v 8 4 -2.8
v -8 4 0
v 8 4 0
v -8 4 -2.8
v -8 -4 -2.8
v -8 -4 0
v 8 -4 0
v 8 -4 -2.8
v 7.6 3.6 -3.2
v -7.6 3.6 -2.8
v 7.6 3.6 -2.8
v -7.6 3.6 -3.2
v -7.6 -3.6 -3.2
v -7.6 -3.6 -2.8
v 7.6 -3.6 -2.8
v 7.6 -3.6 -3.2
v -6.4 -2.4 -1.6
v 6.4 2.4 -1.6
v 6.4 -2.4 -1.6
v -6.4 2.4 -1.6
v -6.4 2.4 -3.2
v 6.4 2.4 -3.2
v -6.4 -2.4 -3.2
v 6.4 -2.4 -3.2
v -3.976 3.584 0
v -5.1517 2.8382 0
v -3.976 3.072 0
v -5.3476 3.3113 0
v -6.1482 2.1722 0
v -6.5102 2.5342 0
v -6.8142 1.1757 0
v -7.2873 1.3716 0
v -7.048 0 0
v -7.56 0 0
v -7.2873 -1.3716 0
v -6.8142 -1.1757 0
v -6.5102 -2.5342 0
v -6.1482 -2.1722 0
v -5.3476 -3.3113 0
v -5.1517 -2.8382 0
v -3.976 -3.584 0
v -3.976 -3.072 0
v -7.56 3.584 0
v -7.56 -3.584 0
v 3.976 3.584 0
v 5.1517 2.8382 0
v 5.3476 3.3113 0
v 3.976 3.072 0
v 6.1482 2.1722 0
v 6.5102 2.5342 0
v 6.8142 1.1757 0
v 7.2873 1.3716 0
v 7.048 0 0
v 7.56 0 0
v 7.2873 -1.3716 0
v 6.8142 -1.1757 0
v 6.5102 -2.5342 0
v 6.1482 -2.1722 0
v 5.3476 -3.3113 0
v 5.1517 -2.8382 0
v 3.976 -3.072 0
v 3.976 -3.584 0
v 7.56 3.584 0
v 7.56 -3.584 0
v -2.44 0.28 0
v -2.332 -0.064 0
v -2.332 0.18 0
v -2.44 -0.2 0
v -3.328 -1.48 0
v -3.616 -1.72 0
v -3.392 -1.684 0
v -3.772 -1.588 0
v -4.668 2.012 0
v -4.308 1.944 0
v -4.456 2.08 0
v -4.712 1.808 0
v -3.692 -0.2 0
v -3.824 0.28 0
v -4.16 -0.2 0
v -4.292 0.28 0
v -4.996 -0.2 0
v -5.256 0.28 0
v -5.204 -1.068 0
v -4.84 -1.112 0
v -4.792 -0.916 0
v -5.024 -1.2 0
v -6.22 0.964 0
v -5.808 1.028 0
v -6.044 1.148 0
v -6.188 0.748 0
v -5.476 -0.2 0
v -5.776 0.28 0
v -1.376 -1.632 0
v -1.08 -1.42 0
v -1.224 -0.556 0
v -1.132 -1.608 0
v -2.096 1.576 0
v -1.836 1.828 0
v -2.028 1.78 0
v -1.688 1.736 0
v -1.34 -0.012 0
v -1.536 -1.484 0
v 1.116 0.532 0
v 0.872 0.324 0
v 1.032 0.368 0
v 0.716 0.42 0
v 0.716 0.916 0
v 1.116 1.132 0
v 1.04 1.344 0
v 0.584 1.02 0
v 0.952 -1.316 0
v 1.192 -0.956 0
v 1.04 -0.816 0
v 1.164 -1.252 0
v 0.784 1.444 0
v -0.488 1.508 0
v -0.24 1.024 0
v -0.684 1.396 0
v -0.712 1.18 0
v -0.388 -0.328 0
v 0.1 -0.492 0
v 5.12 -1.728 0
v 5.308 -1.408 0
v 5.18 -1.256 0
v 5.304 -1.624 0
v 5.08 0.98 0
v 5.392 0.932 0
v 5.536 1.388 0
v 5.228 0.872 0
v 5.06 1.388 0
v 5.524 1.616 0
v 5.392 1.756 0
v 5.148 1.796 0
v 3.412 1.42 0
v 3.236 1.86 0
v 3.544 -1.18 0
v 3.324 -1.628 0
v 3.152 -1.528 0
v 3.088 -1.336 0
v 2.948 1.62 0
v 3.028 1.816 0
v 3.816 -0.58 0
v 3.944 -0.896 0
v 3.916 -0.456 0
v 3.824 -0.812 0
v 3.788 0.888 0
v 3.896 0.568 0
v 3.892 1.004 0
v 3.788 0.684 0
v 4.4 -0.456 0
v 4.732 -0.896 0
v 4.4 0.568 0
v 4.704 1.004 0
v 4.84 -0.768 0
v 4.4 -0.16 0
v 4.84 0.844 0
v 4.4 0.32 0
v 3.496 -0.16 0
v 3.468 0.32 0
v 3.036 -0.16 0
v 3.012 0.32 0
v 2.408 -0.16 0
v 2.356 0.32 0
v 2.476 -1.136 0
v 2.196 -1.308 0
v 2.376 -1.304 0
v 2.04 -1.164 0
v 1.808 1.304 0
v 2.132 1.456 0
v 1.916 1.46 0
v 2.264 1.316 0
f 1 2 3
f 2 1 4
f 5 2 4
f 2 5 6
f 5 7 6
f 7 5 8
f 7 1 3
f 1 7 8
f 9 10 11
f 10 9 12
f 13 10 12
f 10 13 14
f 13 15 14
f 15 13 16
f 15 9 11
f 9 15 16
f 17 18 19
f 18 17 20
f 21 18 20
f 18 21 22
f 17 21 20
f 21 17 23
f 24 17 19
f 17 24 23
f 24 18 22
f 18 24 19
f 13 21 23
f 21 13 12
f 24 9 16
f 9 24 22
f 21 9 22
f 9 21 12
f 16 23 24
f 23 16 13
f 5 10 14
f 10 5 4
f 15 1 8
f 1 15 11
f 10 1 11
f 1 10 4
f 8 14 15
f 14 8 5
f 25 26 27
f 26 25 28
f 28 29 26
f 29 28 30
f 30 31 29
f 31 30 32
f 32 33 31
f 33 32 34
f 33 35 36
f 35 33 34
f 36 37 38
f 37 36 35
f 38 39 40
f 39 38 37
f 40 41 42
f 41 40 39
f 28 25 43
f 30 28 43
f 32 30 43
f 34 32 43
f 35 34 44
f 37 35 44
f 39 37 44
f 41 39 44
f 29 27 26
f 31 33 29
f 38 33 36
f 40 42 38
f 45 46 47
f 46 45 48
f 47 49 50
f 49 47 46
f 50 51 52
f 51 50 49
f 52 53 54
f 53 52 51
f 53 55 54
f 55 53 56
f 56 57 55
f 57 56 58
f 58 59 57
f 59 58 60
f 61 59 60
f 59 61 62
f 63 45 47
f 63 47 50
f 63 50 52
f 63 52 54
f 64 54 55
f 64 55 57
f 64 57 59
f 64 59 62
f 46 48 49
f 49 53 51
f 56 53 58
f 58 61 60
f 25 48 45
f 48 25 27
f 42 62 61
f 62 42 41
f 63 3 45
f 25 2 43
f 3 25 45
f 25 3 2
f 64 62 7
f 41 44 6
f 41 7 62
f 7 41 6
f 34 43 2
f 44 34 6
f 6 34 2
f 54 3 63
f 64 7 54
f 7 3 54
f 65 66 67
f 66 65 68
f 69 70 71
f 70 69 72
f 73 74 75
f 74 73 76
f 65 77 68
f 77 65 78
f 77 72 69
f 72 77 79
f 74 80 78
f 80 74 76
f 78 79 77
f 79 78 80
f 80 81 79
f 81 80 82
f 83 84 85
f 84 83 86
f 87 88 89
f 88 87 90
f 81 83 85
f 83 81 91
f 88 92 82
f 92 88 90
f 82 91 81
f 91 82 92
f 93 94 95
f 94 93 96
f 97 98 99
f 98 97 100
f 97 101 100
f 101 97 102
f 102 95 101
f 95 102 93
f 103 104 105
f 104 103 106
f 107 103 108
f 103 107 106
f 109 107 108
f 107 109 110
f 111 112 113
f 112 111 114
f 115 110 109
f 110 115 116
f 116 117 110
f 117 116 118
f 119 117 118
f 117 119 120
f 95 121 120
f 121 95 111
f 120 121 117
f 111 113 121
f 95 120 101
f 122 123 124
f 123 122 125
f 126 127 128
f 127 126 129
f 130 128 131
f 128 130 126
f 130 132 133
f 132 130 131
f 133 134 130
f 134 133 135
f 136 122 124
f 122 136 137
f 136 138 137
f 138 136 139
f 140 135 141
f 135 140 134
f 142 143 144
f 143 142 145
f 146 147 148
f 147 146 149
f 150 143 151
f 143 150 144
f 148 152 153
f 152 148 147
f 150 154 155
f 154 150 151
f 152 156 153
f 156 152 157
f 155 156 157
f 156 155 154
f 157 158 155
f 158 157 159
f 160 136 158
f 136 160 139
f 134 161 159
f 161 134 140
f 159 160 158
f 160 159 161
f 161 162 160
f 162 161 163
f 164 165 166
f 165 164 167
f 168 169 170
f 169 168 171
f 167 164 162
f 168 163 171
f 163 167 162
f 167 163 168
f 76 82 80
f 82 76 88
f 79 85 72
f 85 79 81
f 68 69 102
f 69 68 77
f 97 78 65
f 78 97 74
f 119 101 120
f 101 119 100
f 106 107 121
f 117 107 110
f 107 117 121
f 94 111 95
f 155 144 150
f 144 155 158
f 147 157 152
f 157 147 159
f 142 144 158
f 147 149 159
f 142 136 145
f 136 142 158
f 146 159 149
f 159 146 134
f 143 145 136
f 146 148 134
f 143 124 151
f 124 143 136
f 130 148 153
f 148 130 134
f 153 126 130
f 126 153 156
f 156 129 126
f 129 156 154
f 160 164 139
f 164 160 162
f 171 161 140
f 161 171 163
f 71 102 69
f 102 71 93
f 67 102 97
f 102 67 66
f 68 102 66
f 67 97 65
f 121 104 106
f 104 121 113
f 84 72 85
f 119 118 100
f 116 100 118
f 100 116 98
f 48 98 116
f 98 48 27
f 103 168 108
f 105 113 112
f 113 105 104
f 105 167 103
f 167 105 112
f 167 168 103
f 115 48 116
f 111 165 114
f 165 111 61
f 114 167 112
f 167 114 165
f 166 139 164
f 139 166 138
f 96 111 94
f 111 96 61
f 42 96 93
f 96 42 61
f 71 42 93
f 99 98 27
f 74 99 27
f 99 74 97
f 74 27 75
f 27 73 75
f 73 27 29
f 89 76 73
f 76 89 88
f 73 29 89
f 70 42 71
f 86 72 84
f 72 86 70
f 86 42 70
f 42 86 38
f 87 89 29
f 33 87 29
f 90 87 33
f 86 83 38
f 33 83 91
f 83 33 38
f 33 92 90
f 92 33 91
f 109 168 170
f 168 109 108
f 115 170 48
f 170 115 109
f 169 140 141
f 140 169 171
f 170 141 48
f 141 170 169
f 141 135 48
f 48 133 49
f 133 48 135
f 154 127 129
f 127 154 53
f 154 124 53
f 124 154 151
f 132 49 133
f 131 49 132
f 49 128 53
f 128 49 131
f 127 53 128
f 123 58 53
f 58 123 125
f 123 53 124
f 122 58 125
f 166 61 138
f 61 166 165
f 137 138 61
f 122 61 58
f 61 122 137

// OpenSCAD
// file: ../p/box5.scad
use <../lib.scad>
function ldraw_lib__box5() = [
// 0 Box with 5 Faces and All Edges
// 0 Name: box5.dat
// 0 Author: James Jessiman
// 0 !LDRAW_ORG Primitive UPDATE 2012-01
// 0 !LICENSE Licensed under CC BY 4.0 : see CAreadme.txt
// 
// 0 BFC CERTIFY CCW
  [0,"BFC","CERTIFY"],
  [0,"BFC","CCW"],
// 
// 0 !HISTORY 2002-04-03 [sbliss] Modified for BFC compliance
// 0 !HISTORY 2002-04-25 [PTadmin] Official Update 2002-02
// 0 !HISTORY 2007-06-24 [PTadmin] Header formatted for Contributor Agreement
// 0 !HISTORY 2008-07-01 [PTadmin] Official Update 2008-01
// 0 !HISTORY 2012-02-16 [Philo] Changed to CCW
// 0 !HISTORY 2012-03-30 [PTadmin] Official Update 2012-01
// 
// 
// 2 24 1 1 1 -1 1 1
  [2,24,1,1,1,-1,1,1],
// 2 24 -1 1 1 -1 1 -1
  [2,24,-1,1,1,-1,1,-1],
// 2 24 -1 1 -1 1 1 -1
  [2,24,-1,1,-1,1,1,-1],
// 2 24 1 1 -1 1 1 1
  [2,24,1,1,-1,1,1,1],
// 2 24 1 0 1 -1 0 1
  [2,24,1,0,1,-1,0,1],
// 2 24 -1 0 1 -1 0 -1
  [2,24,-1,0,1,-1,0,-1],
// 2 24 -1 0 -1 1 0 -1
  [2,24,-1,0,-1,1,0,-1],
// 2 24 1 0 -1 1 0 1
  [2,24,1,0,-1,1,0,1],
// 2 24 1 0 1 1 1 1
  [2,24,1,0,1,1,1,1],
// 2 24 -1 0 1 -1 1 1
  [2,24,-1,0,1,-1,1,1],
// 2 24 1 0 -1 1 1 -1
  [2,24,1,0,-1,1,1,-1],
// 2 24 -1 0 -1 -1 1 -1
  [2,24,-1,0,-1,-1,1,-1],
// 4 16 -1 1 1 1 1 1 1 1 -1 -1 1 -1
  [4,16,-1,1,1,1,1,1,1,1,-1,-1,1,-1],
// 4 16 -1 1 1 -1 0 1 1 0 1 1 1 1
  [4,16,-1,1,1,-1,0,1,1,0,1,1,1,1],
// 4 16 -1 1 -1 -1 0 -1 -1 0 1 -1 1 1
  [4,16,-1,1,-1,-1,0,-1,-1,0,1,-1,1,1],
// 4 16 1 1 -1 1 0 -1 -1 0 -1 -1 1 -1
  [4,16,1,1,-1,1,0,-1,-1,0,-1,-1,1,-1],
// 4 16 1 1 1 1 0 1 1 0 -1 1 1 -1
  [4,16,1,1,1,1,0,1,1,0,-1,1,1,-1],
];
module ldraw_lib__box5(step=0, col=false, unit=2/5, alt=false, line=0.2, solid=!$preview)
    makepoly(ldraw_lib__box5(), step=step, col=col, unit=unit, alt=alt, line=line, solid=solid);
ldraw_lib__box5(line=0.2);
// file: ../p/box4.scad
use <../lib.scad>
function ldraw_lib__box4() = [
// 0 Box with 4 Faces (2 Parallel Pairs) and All Edges
// 0 Name: box4.dat
// 0 Author: James Jessiman
// 0 !LDRAW_ORG Primitive UPDATE 2012-01
// 0 !LICENSE Licensed under CC BY 4.0 : see CAreadme.txt
// 
// 0 BFC CERTIFY CCW
  [0,"BFC","CERTIFY"],
  [0,"BFC","CCW"],
// 
// 0 !HISTORY 2002-04-03 [sbliss] Modified for BFC compliance
// 0 !HISTORY 2002-04-25 [PTadmin] Official Update 2002-02
// 0 !HISTORY 2007-06-24 [PTadmin] Header formatted for Contributor Agreement
// 0 !HISTORY 2008-07-01 [PTadmin] Official Update 2008-01
// 0 !HISTORY 2012-02-16 [Philo] Changed to CCW
// 0 !HISTORY 2012-03-30 [PTadmin] Official Update 2012-01
// 
// 
// 2 24 1 1 1 -1 1 1
  [2,24,1,1,1,-1,1,1],
// 2 24 -1 1 1 -1 1 -1
  [2,24,-1,1,1,-1,1,-1],
// 2 24 -1 1 -1 1 1 -1
  [2,24,-1,1,-1,1,1,-1],
// 2 24 1 1 -1 1 1 1
  [2,24,1,1,-1,1,1,1],
// 2 24 1 0 1 -1 0 1
  [2,24,1,0,1,-1,0,1],
// 2 24 -1 0 1 -1 0 -1
  [2,24,-1,0,1,-1,0,-1],
// 2 24 -1 0 -1 1 0 -1
  [2,24,-1,0,-1,1,0,-1],
// 2 24 1 0 -1 1 0 1
  [2,24,1,0,-1,1,0,1],
// 2 24 1 0 1 1 1 1
  [2,24,1,0,1,1,1,1],
// 2 24 -1 0 1 -1 1 1
  [2,24,-1,0,1,-1,1,1],
// 2 24 1 0 -1 1 1 -1
  [2,24,1,0,-1,1,1,-1],
// 2 24 -1 0 -1 -1 1 -1
  [2,24,-1,0,-1,-1,1,-1],
// 4 16 -1 1 1 -1 0 1 1 0 1 1 1 1
  [4,16,-1,1,1,-1,0,1,1,0,1,1,1,1],
// 4 16 -1 1 -1 -1 0 -1 -1 0 1 -1 1 1
  [4,16,-1,1,-1,-1,0,-1,-1,0,1,-1,1,1],
// 4 16 1 1 -1 1 0 -1 -1 0 -1 -1 1 -1
  [4,16,1,1,-1,1,0,-1,-1,0,-1,-1,1,-1],
// 4 16 1 1 1 1 0 1 1 0 -1 1 1 -1
  [4,16,1,1,1,1,0,1,1,0,-1,1,1,-1],
];
module ldraw_lib__box4(step=0, col=false, unit=2/5, alt=false, line=0.2, solid=!$preview)
    makepoly(ldraw_lib__box4(), step=step, col=col, unit=unit, alt=alt, line=line, solid=solid);
ldraw_lib__box4(line=0.2);
// file: s/3069bs01.scad
use <../../lib.scad>
use <../../p/box4.scad>
use <../../p/box5.scad>
function ldraw_lib__s__3069bs01() = [
// 0 ~Tile  1 x  2 with Groove without Top Face
// 0 Name: s\3069bs01.dat
// 0 Author: Santeri Piippo [arezey]
// 0 !LDRAW_ORG Subpart UPDATE 2010-02
// 0 !LICENSE Licensed under CC BY 4.0 : see CAreadme.txt
// 
// 0 BFC CERTIFY CCW
  [0,"BFC","CERTIFY"],
  [0,"BFC","CCW"],
// 
// 0 !HISTORY 2010-07-05 [PTadmin] Official Update 2010-02
// 
// 
// 1 16 0 0 0 20 0 0 0 7 0 0 0 10 box4.dat
  [1,16,0,0,0,20,0,0,0,7,0,0,0,10, ldraw_lib__box4()],
// 1 16 0 7 0 19 0 0 0 1 0 0 0 9 box4.dat
  [1,16,0,7,0,19,0,0,0,1,0,0,0,9, ldraw_lib__box4()],
// 0 BFC INVERTNEXT
  [0,"BFC","INVERTNEXT"],
// 1 16 0 8 0 16 0 0 0 -4 0 0 0 6 box5.dat
  [1,16,0,8,0,16,0,0,0,-4,0,0,0,6, ldraw_lib__box5()],
// 4 16 -19 8 9 -16 8 6 -16 8 -6 -19 8 -9
  [4,16,-19,8,9,-16,8,6,-16,8,-6,-19,8,-9],
// 4 16 19 8 -9 16 8 -6 16 8 6 19 8 9
  [4,16,19,8,-9,16,8,-6,16,8,6,19,8,9],
// 4 16 19 8 9 16 8 6 -16 8 6 -19 8 9
  [4,16,19,8,9,16,8,6,-16,8,6,-19,8,9],
// 4 16 -19 8 -9 -16 8 -6 16 8 -6 19 8 -9
  [4,16,-19,8,-9,-16,8,-6,16,8,-6,19,8,-9],
// 4 16 -20 7 10 -19 7 9 -19 7 -9 -20 7 -10
  [4,16,-20,7,10,-19,7,9,-19,7,-9,-20,7,-10],
// 4 16 20 7 -10 19 7 -9 19 7 9 20 7 10
  [4,16,20,7,-10,19,7,-9,19,7,9,20,7,10],
// 4 16 20 7 10 19 7 9 -19 7 9 -20 7 10
  [4,16,20,7,10,19,7,9,-19,7,9,-20,7,10],
// 4 16 -20 7 -10 -19 7 -9 19 7 -9 20 7 -10
  [4,16,-20,7,-10,-19,7,-9,19,7,-9,20,7,-10],
// 0 //
];
module ldraw_lib__s__3069bs01(step=0, col=false, unit=2/5, alt=false, line=0.2, solid=!$preview)
    makepoly(ldraw_lib__s__3069bs01(), step=step, col=col, unit=unit, alt=alt, line=line, solid=solid);
ldraw_lib__s__3069bs01(line=0.2);
// file: ../p/2-4ring6.scad
use <../lib.scad>
function ldraw_lib__2_4ring6() = [
// 0 Ring  6 x 0.5
// 0 Name: 2-4ring6.dat
// 0 Author: Niels Karsdorp [nielsk]
// 0 !LDRAW_ORG Primitive UPDATE 2012-01
// 0 !LICENSE Licensed under CC BY 4.0 : see CAreadme.txt
// 
// 0 BFC CERTIFY CCW
  [0,"BFC","CERTIFY"],
  [0,"BFC","CCW"],
// 
// 0 !HISTORY 2004-09-15 [PTadmin] Official Update 2004-03
// 0 !HISTORY 2007-06-24 [PTadmin] Header formatted for Contributor Agreement
// 0 !HISTORY 2008-07-01 [PTadmin] Official Update 2008-01
// 0 !HISTORY 2012-02-16 [Philo] Changed to CCW
// 0 !HISTORY 2012-03-30 [PTadmin] Official Update 2012-01
// 
// 
// 4 16 7 0 0 6.4673 0 2.6789 5.5434 0 2.2962 6 0 0
  [4,16,7,0,0,6.4673,0,2.6789,5.5434,0,2.2962,6,0,0],
// 4 16 6.4673 0 2.6789 4.9497 0 4.9497 4.2426 0 4.2426 5.5434 0 2.2962
  [4,16,6.4673,0,2.6789,4.9497,0,4.9497,4.2426,0,4.2426,5.5434,0,2.2962],
// 4 16 4.9497 0 4.9497 2.6789 0 6.4673 2.2962 0 5.5434 4.2426 0 4.2426
  [4,16,4.9497,0,4.9497,2.6789,0,6.4673,2.2962,0,5.5434,4.2426,0,4.2426],
// 4 16 2.6789 0 6.4673 0 0 7 0 0 6 2.2962 0 5.5434
  [4,16,2.6789,0,6.4673,0,0,7,0,0,6,2.2962,0,5.5434],
// 4 16 0 0 7 -2.6789 0 6.4673 -2.2962 0 5.5434 0 0 6
  [4,16,0,0,7,-2.6789,0,6.4673,-2.2962,0,5.5434,0,0,6],
// 4 16 -2.6789 0 6.4673 -4.9497 0 4.9497 -4.2426 0 4.2426 -2.2962 0 5.5434
  [4,16,-2.6789,0,6.4673,-4.9497,0,4.9497,-4.2426,0,4.2426,-2.2962,0,5.5434],
// 4 16 -4.9497 0 4.9497 -6.4673 0 2.6789 -5.5434 0 2.2962 -4.2426 0 4.2426
  [4,16,-4.9497,0,4.9497,-6.4673,0,2.6789,-5.5434,0,2.2962,-4.2426,0,4.2426],
// 4 16 -6.4673 0 2.6789 -7 0 0 -6 0 0 -5.5434 0 2.2962
  [4,16,-6.4673,0,2.6789,-7,0,0,-6,0,0,-5.5434,0,2.2962],
];
module ldraw_lib__2_4ring6(step=0, col=false, unit=2/5, alt=false, line=0.2, solid=!$preview)
    makepoly(ldraw_lib__2_4ring6(), step=step, col=col, unit=unit, alt=alt, line=line, solid=solid);
ldraw_lib__2_4ring6(line=0.2);
// file: ../p/2-4ndis.scad
use <../lib.scad>
function ldraw_lib__2_4ndis() = [
// 0 Disc Negative 0.5
// 0 Name: 2-4ndis.dat
// 0 Author: James Jessiman
// 0 !LDRAW_ORG Primitive UPDATE 2012-01
// 0 !LICENSE Licensed under CC BY 4.0 : see CAreadme.txt
// 
// 0 BFC CERTIFY CCW
  [0,"BFC","CERTIFY"],
  [0,"BFC","CCW"],
// 
// 0 !HISTORY 2002-03-23 [sbliss] Added BFC statement; compacted code
// 0 !HISTORY 2002-04-25 [PTadmin] Official Update 2002-02
// 0 !HISTORY 2007-06-24 [PTadmin] Header formatted for Contributor Agreement
// 0 !HISTORY 2008-07-01 [PTadmin] Official Update 2008-01
// 0 !HISTORY 2012-02-16 [Philo] Changed to CCW
// 0 !HISTORY 2012-03-30 [PTadmin] Official Update 2012-01
// 
// 
// 3 16 0.9239 0 0.3827 1 0 0 1 0 1
  [3,16,0.9239,0,0.3827,1,0,0,1,0,1],
// 3 16 0.7071 0 0.7071 0.9239 0 0.3827 1 0 1
  [3,16,0.7071,0,0.7071,0.9239,0,0.3827,1,0,1],
// 3 16 0.3827 0 0.9239 0.7071 0 0.7071 1 0 1
  [3,16,0.3827,0,0.9239,0.7071,0,0.7071,1,0,1],
// 3 16 0 0 1 0.3827 0 0.9239 1 0 1
  [3,16,0,0,1,0.3827,0,0.9239,1,0,1],
// 3 16 -0.3827 0 0.9239 0 0 1 -1 0 1
  [3,16,-0.3827,0,0.9239,0,0,1,-1,0,1],
// 3 16 -0.7071 0 0.7071 -0.3827 0 0.9239 -1 0 1
  [3,16,-0.7071,0,0.7071,-0.3827,0,0.9239,-1,0,1],
// 3 16 -0.9239 0 0.3827 -0.7071 0 0.7071 -1 0 1
  [3,16,-0.9239,0,0.3827,-0.7071,0,0.7071,-1,0,1],
// 3 16 -1 0 0 -0.9239 0 0.3827 -1 0 1
  [3,16,-1,0,0,-0.9239,0,0.3827,-1,0,1],
];
module ldraw_lib__2_4ndis(step=0, col=false, unit=2/5, alt=false, line=0.2, solid=!$preview)
    makepoly(ldraw_lib__2_4ndis(), step=step, col=col, unit=unit, alt=alt, line=line, solid=solid);
ldraw_lib__2_4ndis(line=0.2);
// file: ../p/1-8chrd.scad
use <../lib.scad>
function ldraw_lib__1_8chrd() = [
// 0 Chord 0.125
// 0 Name: 1-8chrd.dat
// 0 Author: Orion Pobursky [OrionP]
// 0 !LDRAW_ORG Primitive UPDATE 2023-05
// 0 !LICENSE Licensed under CC BY 4.0 : see CAreadme.txt
// 
// 0 BFC CERTIFY CCW
  [0,"BFC","CERTIFY"],
  [0,"BFC","CCW"],
// 
// 0 !HISTORY 2004-04-22 [PTadmin] Official Update 2004-02
// 0 !HISTORY 2007-06-22 [PTadmin] Header formatted for Contributor Agreement
// 0 !HISTORY 2008-07-01 [PTadmin] Official Update 2008-01
// 0 !HISTORY 2023-10-27 [OrionP] Rebuilt with PrimGen2, original author westrate
// 0 !HISTORY 2023-10-31 [OrionP] Official Update 2023-05
// 
// 3 16 1 0 0 0.9239 0 0.3827 0.7071 0 0.7071
  [3,16,1,0,0,0.9239,0,0.3827,0.7071,0,0.7071],
];
module ldraw_lib__1_8chrd(step=0, col=false, unit=2/5, alt=false, line=0.2, solid=!$preview)
    makepoly(ldraw_lib__1_8chrd(), step=step, col=col, unit=unit, alt=alt, line=line, solid=solid);
ldraw_lib__1_8chrd(line=0.2);
// main file
use <../lib.scad>
use <../p/1-8chrd.scad>
use <../p/2-4ndis.scad>
use <../p/2-4ring6.scad>
use <s/3069bs01.scad>
function ldraw_lib__3069bp1d() = [
// 0 Tile  1 x  2 with Black Japanese Logogramm (10 million ryo) Pattern
// 0 Name: 3069bp1d.dat
// 0 Author: Manfred Schaefer [Lego-Manfred]
// 0 !LDRAW_ORG Part UPDATE 2024-10
// 0 !LICENSE Licensed under CC BY 4.0 : see CAreadme.txt
// 
// 0 BFC CERTIFY CCW
  [0,"BFC","CERTIFY"],
  [0,"BFC","CCW"],
// 
// 0 !KEYWORDS Brickheadz, BrickLink 3069pb0767, Brickowl 684565, Lucky Cat
// 0 !KEYWORDS Rebrickable 3069bpr0280, Set 40436
// 
// 0 !HISTORY 2024-12-01 [OrionP] Official Update 2024-10
// 
// 1 16 0 0 0 1 0 0 0 1 0 0 0 1 s\3069bs01.dat
  [1,16,0,0,0,1,0,0,0,1,0,0,0,1, ldraw_lib__s__3069bs01()],
// 0 BFC CERTIFY CCW
  [0,"BFC","CERTIFY"],
  [0,"BFC","CCW"],
// 
// 1 0 -9.94 0 0 0 0 -1.28 0 1 0 1.28 0 0 2-4ring6.dat
  [1,0,-9.94,0,0,0,0,-1.28,0,1,0,1.28,0,0, ldraw_lib__2_4ring6()],
// 1 16 -9.94 0 0 0 0 -8.96 0 1 0 8.96 0 0 2-4ndis.dat
  [1,16,-9.94,0,0,0,0,-8.96,0,1,0,8.96,0,0, ldraw_lib__2_4ndis()],
// 1 16 -9.94 0 0 0 0 -7.68 0 1 0 7.68 0 0 1-8chrd.dat
  [1,16,-9.94,0,0,0,0,-7.68,0,1,0,7.68,0,0, ldraw_lib__1_8chrd()],
// 1 16 -9.94 0 0 -7.68 0 0 0 1 0 0 0 7.68 1-8chrd.dat
  [1,16,-9.94,0,0,-7.68,0,0,0,1,0,0,0,7.68, ldraw_lib__1_8chrd()],
// 1 16 -9.94 0 0 -7.68 0 0 0 1 0 0 0 -7.68 1-8chrd.dat
  [1,16,-9.94,0,0,-7.68,0,0,0,1,0,0,0,-7.68, ldraw_lib__1_8chrd()],
// 1 16 -9.94 0 0 0 0 -7.68 0 1 0 -7.68 0 0 1-8chrd.dat
  [1,16,-9.94,0,0,0,0,-7.68,0,1,0,-7.68,0,0, ldraw_lib__1_8chrd()],
// 1 0 9.94 0 0 0 0 1.28 0 1 0 1.28 0 0 2-4ring6.dat
  [1,0,9.94,0,0,0,0,1.28,0,1,0,1.28,0,0, ldraw_lib__2_4ring6()],
// 1 16 9.94 0 0 0 0 8.96 0 1 0 8.96 0 0 2-4ndis.dat
  [1,16,9.94,0,0,0,0,8.96,0,1,0,8.96,0,0, ldraw_lib__2_4ndis()],
// 1 16 9.94 0 0 0 0 7.68 0 1 0 7.68 0 0 1-8chrd.dat
  [1,16,9.94,0,0,0,0,7.68,0,1,0,7.68,0,0, ldraw_lib__1_8chrd()],
// 1 16 9.94 0 0 7.68 0 0 0 1 0 0 0 7.68 1-8chrd.dat
  [1,16,9.94,0,0,7.68,0,0,0,1,0,0,0,7.68, ldraw_lib__1_8chrd()],
// 1 16 9.94 0 0 7.68 0 0 0 1 0 0 0 -7.68 1-8chrd.dat
  [1,16,9.94,0,0,7.68,0,0,0,1,0,0,0,-7.68, ldraw_lib__1_8chrd()],
// 1 16 9.94 0 0 0 0 7.68 0 1 0 -7.68 0 0 1-8chrd.dat
  [1,16,9.94,0,0,0,0,7.68,0,1,0,-7.68,0,0, ldraw_lib__1_8chrd()],
// 4 0 -9.94 0 7.68 9.94 0 7.68 9.94 0 8.96 -9.94 0 8.96
  [4,0,-9.94,0,7.68,9.94,0,7.68,9.94,0,8.96,-9.94,0,8.96],
// 4 0 -9.94 0 -8.96 9.94 0 -8.96 9.94 0 -7.68 -9.94 0 -7.68
  [4,0,-9.94,0,-8.96,9.94,0,-8.96,9.94,0,-7.68,-9.94,0,-7.68],
// 3 16 18.9 0 8.96 20 0 10 9.94 0 8.96
  [3,16,18.9,0,8.96,20,0,10,9.94,0,8.96],
// 3 16 -9.94 0 8.96 -20 0 10 -18.9 0 8.96
  [3,16,-9.94,0,8.96,-20,0,10,-18.9,0,8.96],
// 4 16 20 0 10 -20 0 10 -9.94 0 8.96 9.94 0 8.96
  [4,16,20,0,10,-20,0,10,-9.94,0,8.96,9.94,0,8.96],
// 3 16 18.9 0 -8.96 9.94 0 -8.96 20 0 -10
  [3,16,18.9,0,-8.96,9.94,0,-8.96,20,0,-10],
// 3 16 -9.94 0 -8.96 -18.9 0 -8.96 -20 0 -10
  [3,16,-9.94,0,-8.96,-18.9,0,-8.96,-20,0,-10],
// 4 16 20 0 -10 9.94 0 -8.96 -9.94 0 -8.96 -20 0 -10
  [4,16,20,0,-10,9.94,0,-8.96,-9.94,0,-8.96,-20,0,-10],
// 3 16 -18.9 0 0 -18.9 0 8.96 -20 0 10
  [3,16,-18.9,0,0,-18.9,0,8.96,-20,0,10],
// 3 16 -18.9 0 -8.96 -18.9 0 0 -20 0 -10
  [3,16,-18.9,0,-8.96,-18.9,0,0,-20,0,-10],
// 3 16 -20 0 -10 -18.9 0 0 -20 0 10
  [3,16,-20,0,-10,-18.9,0,0,-20,0,10],
// 3 16 18.9 0 0 20 0 10 18.9 0 8.96
  [3,16,18.9,0,0,20,0,10,18.9,0,8.96],
// 3 16 18.9 0 -8.96 20 0 -10 18.9 0 0
  [3,16,18.9,0,-8.96,20,0,-10,18.9,0,0],
// 3 16 20 0 -10 20 0 10 18.9 0 0
  [3,16,20,0,-10,20,0,10,18.9,0,0],
// 4 0 -6.1 0 -.5 -5.83 0 -.16 -5.83 0 .45 -6.1 0 .7
  [4,0,-6.1,0,-.5,-5.83,0,-.16,-5.83,0,.45,-6.1,0,.7],
// 4 0 -9.04 0 -4.3 -8.48 0 -4.21 -8.32 0 -3.7 -9.43 0 -3.97
  [4,0,-9.04,0,-4.3,-8.48,0,-4.21,-8.32,0,-3.7,-9.43,0,-3.97],
// 4 0 -10.77 0 4.86 -11.14 0 5.2 -11.67 0 5.03 -11.78 0 4.52
  [4,0,-10.77,0,4.86,-11.14,0,5.2,-11.67,0,5.03,-11.78,0,4.52],
// 4 0 -6.1 0 -.5 -6.1 0 .7 -9.56 0 .7 -9.23 0 -.5
  [4,0,-6.1,0,-.5,-6.1,0,.7,-9.56,0,.7,-9.23,0,-.5],
// 4 0 -9.43 0 -3.97 -8.32 0 -3.7 -9.23 0 -.5 -10.4 0 -.5
  [4,0,-9.43,0,-3.97,-8.32,0,-3.7,-9.23,0,-.5,-10.4,0,-.5],
// 4 0 -11.78 0 4.52 -10.73 0 .7 -9.56 0 .7 -10.77 0 4.86
  [4,0,-11.78,0,4.52,-10.73,0,.7,-9.56,0,.7,-10.77,0,4.86],
// 4 0 -9.23 0 -.5 -9.56 0 .7 -10.73 0 .7 -10.4 0 -.5
  [4,0,-9.23,0,-.5,-9.56,0,.7,-10.73,0,.7,-10.4,0,-.5],
// 4 0 -10.4 0 -.5 -10.73 0 .7 -13.14 0 .7 -12.49 0 -.5
  [4,0,-10.4,0,-.5,-10.73,0,.7,-13.14,0,.7,-12.49,0,-.5],
// 4 0 -12.56 0 -3 -12.1 0 -2.78 -11.98 0 -2.29 -13.01 0 -2.67
  [4,0,-12.56,0,-3,-12.1,0,-2.78,-11.98,0,-2.29,-13.01,0,-2.67],
// 4 0 -14.52 0 2.57 -15.11 0 2.87 -15.55 0 2.41 -15.47 0 1.87
  [4,0,-14.52,0,2.57,-15.11,0,2.87,-15.55,0,2.41,-15.47,0,1.87],
// 4 0 -13.01 0 -2.67 -11.98 0 -2.29 -12.49 0 -.5 -13.69 0 -.5
  [4,0,-13.01,0,-2.67,-11.98,0,-2.29,-12.49,0,-.5,-13.69,0,-.5],
// 4 0 -15.47 0 1.87 -14.44 0 .7 -13.14 0 .7 -14.52 0 2.57
  [4,0,-15.47,0,1.87,-14.44,0,.7,-13.14,0,.7,-14.52,0,2.57],
// 4 0 -12.49 0 -.5 -13.14 0 .7 -14.44 0 .7 -13.69 0 -.5
  [4,0,-12.49,0,-.5,-13.14,0,.7,-14.44,0,.7,-13.69,0,-.5],
// 4 0 -3.44 0 -4.08 -2.83 0 -4.02 -2.7 0 -3.55 -3.06 0 -1.39
  [4,0,-3.44,0,-4.08,-2.83,0,-4.02,-2.7,0,-3.55,-3.06,0,-1.39],
// 4 0 -4.22 0 4.34 -4.59 0 4.57 -5.07 0 4.45 -5.24 0 3.94
  [4,0,-4.22,0,4.34,-4.59,0,4.57,-5.07,0,4.45,-5.24,0,3.94],
// 4 0 -5.24 0 3.94 -3.84 0 -3.71 -3.35 0 -.03 -4.22 0 4.34
  [4,0,-5.24,0,3.94,-3.84,0,-3.71,-3.35,0,-.03,-4.22,0,4.34],
// 4 0 -3.44 0 -4.08 -3.06 0 -1.39 -3.35 0 -.03 -3.84 0 -3.71
  [4,0,-3.44,0,-4.08,-3.06,0,-1.39,-3.35,0,-.03,-3.84,0,-3.71],
// 4 0 2.18 0 0.81 2.58 0 .92 2.79 0 1.33 1.79 0 1.05
  [4,0,2.18,0,0.81,2.58,0,.92,2.79,0,1.33,1.79,0,1.05],
// 4 0 1.79 0 1.05 2.79 0 1.33 2.79 0 2.83 1.79 0 2.29
  [4,0,1.79,0,1.05,2.79,0,1.33,2.79,0,2.83,1.79,0,2.29],
// 4 0 1.79 0 2.29 2.79 0 2.83 2.6 0 3.36 1.46 0 2.55
  [4,0,1.79,0,2.29,2.79,0,2.83,2.6,0,3.36,1.46,0,2.55],
// 4 0 2.38 0 -3.29 2.91 0 -3.13 2.98 0 -2.39 2.6 0 -2.04
  [4,0,2.38,0,-3.29,2.91,0,-3.13,2.98,0,-2.39,2.6,0,-2.04],
// 4 0 1.46 0 2.55 2.6 0 3.36 1.96 0 3.61 -1.22 0 3.77
  [4,0,1.46,0,2.55,2.6,0,3.36,1.96,0,3.61,-1.22,0,3.77],
// 4 0 1.46 0 2.55 -1.22 0 3.77 -1.71 0 3.49 -.6 0 2.56
  [4,0,1.46,0,2.55,-1.22,0,3.77,-1.71,0,3.49,-.6,0,2.56],
// 4 0 -.6 0 2.56 -1.71 0 3.49 -1.78 0 2.95 -.97 0 -.82
  [4,0,-.6,0,2.56,-1.71,0,3.49,-1.78,0,2.95,-.97,0,-.82],
// 4 0 2.38 0 -3.29 .25 0 -1.23 -.97 0 -.82 -3.06 0 -1.39
  [4,0,2.38,0,-3.29,.25,0,-1.23,-.97,0,-.82,-3.06,0,-1.39],
// 3 0 -.97 0 -.82 .25 0 -1.23 -.6 0 2.56
  [3,0,-.97,0,-.82,.25,0,-1.23,-.6,0,2.56],
// 3 0 2.38 0 -3.29 2.6 0 -2.04 .25 0 -1.23
  [3,0,2.38,0,-3.29,2.6,0,-2.04,.25,0,-1.23],
// 3 0 -3.06 0 -1.39 -.97 0 -.82 -3.35 0 -.03
  [3,0,-3.06,0,-1.39,-.97,0,-.82,-3.35,0,-.03],
// 4 0 12.8 0 -4.32 13.26 0 -4.06 13.27 0 -3.52 12.95 0 -3.14
  [4,0,12.8,0,-4.32,13.26,0,-4.06,13.27,0,-3.52,12.95,0,-3.14],
// 4 0 13.07 0 2.18 13.48 0 2.33 13.84 0 3.47 12.7 0 2.45
  [4,0,13.07,0,2.18,13.48,0,2.33,13.84,0,3.47,12.7,0,2.45],
// 4 0 12.7 0 2.45 13.84 0 3.47 13.81 0 4.04 12.65 0 3.47
  [4,0,12.7,0,2.45,13.84,0,3.47,13.81,0,4.04,12.65,0,3.47],
// 4 0 12.65 0 3.47 13.81 0 4.04 13.48 0 4.39 12.87 0 4.49
  [4,0,12.65,0,3.47,13.81,0,4.04,13.48,0,4.39,12.87,0,4.49],
// 4 0 12.65 0 3.47 12.87 0 4.49 8.09 0 4.65 8.53 0 3.55
  [4,0,12.65,0,3.47,12.87,0,4.49,8.09,0,4.65,8.53,0,3.55],
// 4 0 12.8 0 -4.32 12.95 0 -3.14 8.86 0 -2.95 8.31 0 -4.07
  [4,0,12.8,0,-4.32,12.95,0,-3.14,8.86,0,-2.95,8.31,0,-4.07],
// 4 0 8.31 0 -4.07 8.86 0 -2.95 7.72 0 -3.34 7.88 0 -3.82
  [4,0,8.31,0,-4.07,8.86,0,-2.95,7.72,0,-3.34,7.88,0,-3.82],
// 4 0 8.53 0 3.55 8.09 0 4.65 7.57 0 4.54 7.37 0 4.05
  [4,0,8.53,0,3.55,8.09,0,4.65,7.57,0,4.54,7.37,0,4.05],
// 4 0 9.86 0 -2.24 9.79 0 -1.14 9.54 0 -1.45 9.56 0 -2.03
  [4,0,9.86,0,-2.24,9.79,0,-1.14,9.54,0,-1.45,9.56,0,-2.03],
// 4 0 9.74 0 1.42 9.73 0 2.51 9.47 0 2.22 9.47 0 1.71
  [4,0,9.74,0,1.42,9.73,0,2.51,9.47,0,2.22,9.47,0,1.71],
// 4 0 9.86 0 -2.24 11.83 0 -2.24 11 0 -1.14 9.79 0 -1.14
  [4,0,9.86,0,-2.24,11.83,0,-2.24,11,0,-1.14,9.79,0,-1.14],
// 4 0 9.74 0 1.42 11 0 1.42 11.76 0 2.51 9.73 0 2.51
  [4,0,9.74,0,1.42,11,0,1.42,11.76,0,2.51,9.73,0,2.51],
// 4 0 11.83 0 -2.24 12.1 0 -1.92 11 0 -.4 11 0 -1.14
  [4,0,11.83,0,-2.24,12.1,0,-1.92,11,0,-.4,11,0,-1.14],
// 4 0 11 0 1.42 11 0 .8 12.1 0 2.11 11.76 0 2.51
  [4,0,11,0,1.42,11,0,.8,12.1,0,2.11,11.76,0,2.51],
// 4 0 12.1 0 -1.92 12.1 0 2.11 11 0 .8 11 0 -.4
  [4,0,12.1,0,-1.92,12.1,0,2.11,11,0,.8,11,0,-.4],
// 4 0 11 0 -.4 11 0 .8 8.67 0 .8 8.74 0 -.4
  [4,0,11,0,-.4,11,0,.8,8.67,0,.8,8.74,0,-.4],
// 4 0 7.72 0 -3.34 8.86 0 -2.95 8.74 0 -.4 7.59 0 -.4
  [4,0,7.72,0,-3.34,8.86,0,-2.95,8.74,0,-.4,7.59,0,-.4],
// 4 0 8.53 0 3.55 7.37 0 4.05 7.53 0 .8 8.67 0 .8
  [4,0,8.53,0,3.55,7.37,0,4.05,7.53,0,.8,8.67,0,.8],
// 4 0 8.74 0 -.4 8.67 0 .8 7.53 0 .8 7.59 0 -.4
  [4,0,8.74,0,-.4,8.67,0,.8,7.53,0,.8,7.59,0,-.4],
// 4 0 7.59 0 -.4 7.53 0 .8 5.89 0 .8 6.02 0 -.4
  [4,0,7.59,0,-.4,7.53,0,.8,5.89,0,.8,6.02,0,-.4],
// 4 0 5.49 0 -3.27 5.94 0 -3.26 6.19 0 -2.84 5.1 0 -2.91
  [4,0,5.49,0,-3.27,5.94,0,-3.26,6.19,0,-2.84,5.1,0,-2.91],
// 4 0 5.66 0 3.29 5.33 0 3.64 4.79 0 3.65 4.52 0 3.26
  [4,0,5.66,0,3.29,5.33,0,3.64,4.79,0,3.65,4.52,0,3.26],
// 3 0 5.1 0 -2.91 6.19 0 -2.84 6.02 0 -.4
  [3,0,5.1,0,-2.91,6.19,0,-2.84,6.02,0,-.4],
// 3 0 4.52 0 3.26 5.89 0 .8 5.66 0 3.29
  [3,0,4.52,0,3.26,5.89,0,.8,5.66,0,3.29],
// 4 0 6.02 0 -.4 5.89 0 .8 4.52 0 3.26 5.1 0 -2.91
  [4,0,6.02,0,-.4,5.89,0,.8,4.52,0,3.26,5.1,0,-2.91],
// 4 16 -10.73 0 0.7 -11.78 0 4.52 -14.52 0 2.57 -13.14 0 .7
  [4,16,-10.73,0,0.7,-11.78,0,4.52,-14.52,0,2.57,-13.14,0,.7],
// 4 16 -9.43 0 -3.97 -10.4 0 -.5 -12.49 0 -.5 -11.98 0 -2.29
  [4,16,-9.43,0,-3.97,-10.4,0,-.5,-12.49,0,-.5,-11.98,0,-2.29],
// 4 16 -6.1 0 -.5 -9.23 0 -.5 -8.32 0 -3.7 -3.84 0 -3.71
  [4,16,-6.1,0,-.5,-9.23,0,-.5,-8.32,0,-3.7,-3.84,0,-3.71],
// 4 16 -6.1 0 0.7 -5.24 0 3.94 -10.77 0 4.86 -9.56 0 .7
  [4,16,-6.1,0,0.7,-5.24,0,3.94,-10.77,0,4.86,-9.56,0,.7],
// 4 16 -3.35 0 -.03 -.97 0 -.82 -1.78 0 2.95 -4.22 0 4.34
  [4,16,-3.35,0,-.03,-.97,0,-.82,-1.78,0,2.95,-4.22,0,4.34],
// 3 16 1.79 0 1.05 1.79 0 2.29 .25 0 -1.23
  [3,16,1.79,0,1.05,1.79,0,2.29,.25,0,-1.23],
// 4 16 1.79 0 2.29 1.46 0 2.55 -.6 0 2.56 .25 0 -1.23
  [4,16,1.79,0,2.29,1.46,0,2.55,-.6,0,2.56,.25,0,-1.23],
// 3 16 -2.7 0 -3.55 2.38 0 -3.29 -3.06 0 -1.39
  [3,16,-2.7,0,-3.55,2.38,0,-3.29,-3.06,0,-1.39],
// 4 16 11 0 -1.14 11 0 -.4 8.74 0 -.4 9.79 0 -1.14
  [4,16,11,0,-1.14,11,0,-.4,8.74,0,-.4,9.79,0,-1.14],
// 4 16 11 0 1.42 9.74 0 1.42 8.67 0 .8 11 0 .8
  [4,16,11,0,1.42,9.74,0,1.42,8.67,0,.8,11,0,.8],
// 3 16 9.54 0 -1.45 9.79 0 -1.14 8.74 0 -.4
  [3,16,9.54,0,-1.45,9.79,0,-1.14,8.74,0,-.4],
// 3 16 9.74 0 1.42 9.47 0 1.71 8.67 0 .8
  [3,16,9.74,0,1.42,9.47,0,1.71,8.67,0,.8],
// 4 16 9.56 0 -2.03 9.54 0 -1.45 8.74 0 -.4 8.86 0 -2.95
  [4,16,9.56,0,-2.03,9.54,0,-1.45,8.74,0,-.4,8.86,0,-2.95],
// 4 16 9.47 0 1.71 9.47 0 2.22 8.53 0 3.55 8.67 0 .8
  [4,16,9.47,0,1.71,9.47,0,2.22,8.53,0,3.55,8.67,0,.8],
// 3 16 9.86 0 -2.24 9.56 0 -2.03 8.86 0 -2.95
  [3,16,9.86,0,-2.24,9.56,0,-2.03,8.86,0,-2.95],
// 3 16 9.47 0 2.22 9.73 0 2.51 8.53 0 3.55
  [3,16,9.47,0,2.22,9.73,0,2.51,8.53,0,3.55],
// 4 16 12.95 0 -3.14 11.83 0 -2.24 9.86 0 -2.24 8.86 0 -2.95
  [4,16,12.95,0,-3.14,11.83,0,-2.24,9.86,0,-2.24,8.86,0,-2.95],
// 4 16 12.65 0 3.47 8.53 0 3.55 9.73 0 2.51 11.76 0 2.51
  [4,16,12.65,0,3.47,8.53,0,3.55,9.73,0,2.51,11.76,0,2.51],
// 4 16 12.7 0 2.45 12.65 0 3.47 11.76 0 2.51 12.1 0 2.11
  [4,16,12.7,0,2.45,12.65,0,3.47,11.76,0,2.51,12.1,0,2.11],
// 4 16 13.07 0 2.18 12.7 0 2.45 12.1 0 2.11 12.1 0 -1.92
  [4,16,13.07,0,2.18,12.7,0,2.45,12.1,0,2.11,12.1,0,-1.92],
// 4 16 7.72 0 -3.34 7.59 0 -.4 6.02 0 -.4 6.19 0 -2.84
  [4,16,7.72,0,-3.34,7.59,0,-.4,6.02,0,-.4,6.19,0,-2.84],
// 4 16 7.53 0 0.8 7.37 0 4.05 5.66 0 3.29 5.89 0 .8
  [4,16,7.53,0,0.8,7.37,0,4.05,5.66,0,3.29,5.89,0,.8],
// 4 16 -8.48 0 -4.21 -3.44 0 -4.08 -3.84 0 -3.71 -8.32 0 -3.7
  [4,16,-8.48,0,-4.21,-3.44,0,-4.08,-3.84,0,-3.71,-8.32,0,-3.7],
// 4 16 -5.83 0 -.16 -3.84 0 -3.71 -5.24 0 3.94 -5.83 0 .45
  [4,16,-5.83,0,-.16,-3.84,0,-3.71,-5.24,0,3.94,-5.83,0,.45],
// 3 16 -6.1 0 -.5 -3.84 0 -3.71 -5.83 0 -.16
  [3,16,-6.1,0,-.5,-3.84,0,-3.71,-5.83,0,-.16],
// 3 16 -5.83 0 0.45 -5.24 0 3.94 -6.1 0 .7
  [3,16,-5.83,0,0.45,-5.24,0,3.94,-6.1,0,.7],
// 4 16 2.18 0 0.81 1.79 0 1.05 .25 0 -1.23 2.6 0 -2.04
  [4,16,2.18,0,0.81,1.79,0,1.05,.25,0,-1.23,2.6,0,-2.04],
// 3 16 -12.1 0 -2.78 -9.43 0 -3.97 -11.98 0 -2.29
  [3,16,-12.1,0,-2.78,-9.43,0,-3.97,-11.98,0,-2.29],
// 3 16 -1.78 0 2.95 -1.71 0 3.49 -4.22 0 4.34
  [3,16,-1.78,0,2.95,-1.71,0,3.49,-4.22,0,4.34],
// 4 16 -4.22 0 4.34 -1.71 0 3.49 -1.22 0 3.77 -4.59 0 4.57
  [4,16,-4.22,0,4.34,-1.71,0,3.49,-1.22,0,3.77,-4.59,0,4.57],
// 4 16 9.94 0 7.68 -9.94 0 7.68 -4.59 0 4.57 -1.22 0 3.77
  [4,16,9.94,0,7.68,-9.94,0,7.68,-4.59,0,4.57,-1.22,0,3.77],
// 3 16 2.79 0 1.33 4.52 0 3.26 2.79 0 2.83
  [3,16,2.79,0,1.33,4.52,0,3.26,2.79,0,2.83],
// 4 16 2.18 0 0.81 2.6 0 -2.04 2.98 0 -2.39 2.58 0 .92
  [4,16,2.18,0,0.81,2.6,0,-2.04,2.98,0,-2.39,2.58,0,.92],
// 4 16 2.58 0 0.92 2.98 0 -2.39 5.1 0 -2.91 2.79 0 1.33
  [4,16,2.58,0,0.92,2.98,0,-2.39,5.1,0,-2.91,2.79,0,1.33],
// 3 16 5.1 0 -2.91 4.52 0 3.26 2.79 0 1.33
  [3,16,5.1,0,-2.91,4.52,0,3.26,2.79,0,1.33],
// 3 16 1.96 0 3.61 9.94 0 7.68 -1.22 0 3.77
  [3,16,1.96,0,3.61,9.94,0,7.68,-1.22,0,3.77],
// 4 16 2.38 0 -3.29 9.94 0 -7.68 5.49 0 -3.27 2.91 0 -3.13
  [4,16,2.38,0,-3.29,9.94,0,-7.68,5.49,0,-3.27,2.91,0,-3.13],
// 4 16 2.91 0 -3.13 5.49 0 -3.27 5.1 0 -2.91 2.98 0 -2.39
  [4,16,2.91,0,-3.13,5.49,0,-3.27,5.1,0,-2.91,2.98,0,-2.39],
// 4 16 7.88 0 -3.82 7.72 0 -3.34 6.19 0 -2.84 5.94 0 -3.26
  [4,16,7.88,0,-3.82,7.72,0,-3.34,6.19,0,-2.84,5.94,0,-3.26],
// 4 16 -2.83 0 -4.02 9.94 0 -7.68 2.38 0 -3.29 -2.7 0 -3.55
  [4,16,-2.83,0,-4.02,9.94,0,-7.68,2.38,0,-3.29,-2.7,0,-3.55],
// 4 16 9.94 0 -7.68 -2.83 0 -4.02 -3.44 0 -4.08 -9.94 0 -7.68
  [4,16,9.94,0,-7.68,-2.83,0,-4.02,-3.44,0,-4.08,-9.94,0,-7.68],
// 3 16 -8.48 0 -4.21 -9.94 0 -7.68 -3.44 0 -4.08
  [3,16,-8.48,0,-4.21,-9.94,0,-7.68,-3.44,0,-4.08],
// 3 16 -5.07 0 4.45 -4.59 0 4.57 -9.94 0 7.68
  [3,16,-5.07,0,4.45,-4.59,0,4.57,-9.94,0,7.68],
// 4 16 -5.24 0 3.94 -5.07 0 4.45 -9.94 0 7.68 -10.77 0 4.86
  [4,16,-5.24,0,3.94,-5.07,0,4.45,-9.94,0,7.68,-10.77,0,4.86],
// 3 16 -10.77 0 4.86 -9.94 0 7.68 -11.14 0 5.2
  [3,16,-10.77,0,4.86,-9.94,0,7.68,-11.14,0,5.2],
// 4 16 -15.370528 0 5.430528 -11.67 0 5.03 -11.14 0 5.2 -9.94 0 7.68
  [4,16,-15.370528,0,5.430528,-11.67,0,5.03,-11.14,0,5.2,-9.94,0,7.68],
// 4 16 -11.78 0 4.52 -11.67 0 5.03 -15.11 0 2.87 -14.52 0 2.57
  [4,16,-11.78,0,4.52,-11.67,0,5.03,-15.11,0,2.87,-14.52,0,2.57],
// 3 16 -11.67 0 5.03 -15.370528 0 5.430528 -15.11 0 2.87
  [3,16,-11.67,0,5.03,-15.370528,0,5.430528,-15.11,0,2.87],
// 3 16 -9.04 0 -4.3 -9.94 0 -7.68 -8.48 0 -4.21
  [3,16,-9.04,0,-4.3,-9.94,0,-7.68,-8.48,0,-4.21],
// 4 16 -9.04 0 -4.3 -9.43 0 -3.97 -12.1 0 -2.78 -12.56 0 -3
  [4,16,-9.04,0,-4.3,-9.43,0,-3.97,-12.1,0,-2.78,-12.56,0,-3],
// 4 16 -9.94 0 -7.68 -9.04 0 -4.3 -12.56 0 -3 -15.370528 0 -5.430528
  [4,16,-9.94,0,-7.68,-9.04,0,-4.3,-12.56,0,-3,-15.370528,0,-5.430528],
// 3 16 -15.55 0 2.41 -15.11 0 2.87 -15.370528 0 5.430528
  [3,16,-15.55,0,2.41,-15.11,0,2.87,-15.370528,0,5.430528],
// 3 16 -17.62 0 0 -15.55 0 2.41 -15.370528 0 5.430528
  [3,16,-17.62,0,0,-15.55,0,2.41,-15.370528,0,5.430528],
// 3 16 -15.47 0 1.87 -15.55 0 2.41 -17.62 0 0
  [3,16,-15.47,0,1.87,-15.55,0,2.41,-17.62,0,0],
// 3 16 -12.56 0 -3 -13.01 0 -2.67 -15.370528 0 -5.430528
  [3,16,-12.56,0,-3,-13.01,0,-2.67,-15.370528,0,-5.430528],
// 4 16 -15.370528 0 -5.430528 -13.01 0 -2.67 -13.69 0 -.5 -17.62 0 0
  [4,16,-15.370528,0,-5.430528,-13.01,0,-2.67,-13.69,0,-.5,-17.62,0,0],
// 4 16 -14.44 0 0.7 -15.47 0 1.87 -17.62 0 0 -13.69 0 -.5
  [4,16,-14.44,0,0.7,-15.47,0,1.87,-17.62,0,0,-13.69,0,-.5],
// 4 16 2.79 0 2.83 4.52 0 3.26 4.79 0 3.65 2.6 0 3.36
  [4,16,2.79,0,2.83,4.52,0,3.26,4.79,0,3.65,2.6,0,3.36],
// 4 16 2.6 0 3.36 4.79 0 3.65 9.94 0 7.68 1.96 0 3.61
  [4,16,2.6,0,3.36,4.79,0,3.65,9.94,0,7.68,1.96,0,3.61],
// 4 16 7.37 0 4.05 7.57 0 4.54 5.33 0 3.64 5.66 0 3.29
  [4,16,7.37,0,4.05,7.57,0,4.54,5.33,0,3.64,5.66,0,3.29],
// 4 16 5.33 0 3.64 7.57 0 4.54 9.94 0 7.68 4.79 0 3.65
  [4,16,5.33,0,3.64,7.57,0,4.54,9.94,0,7.68,4.79,0,3.65],
// 3 16 7.57 0 4.54 8.09 0 4.65 9.94 0 7.68
  [3,16,7.57,0,4.54,8.09,0,4.65,9.94,0,7.68],
// 4 16 15.370528 0 5.430528 9.94 0 7.68 8.09 0 4.65 12.87 0 4.49
  [4,16,15.370528,0,5.430528,9.94,0,7.68,8.09,0,4.65,12.87,0,4.49],
// 4 16 13.07 0 2.18 12.1 0 -1.92 17.62 0 0 13.48 0 2.33
  [4,16,13.07,0,2.18,12.1,0,-1.92,17.62,0,0,13.48,0,2.33],
// 4 16 11.83 0 -2.24 12.95 0 -3.14 17.62 0 0 12.1 0 -1.92
  [4,16,11.83,0,-2.24,12.95,0,-3.14,17.62,0,0,12.1,0,-1.92],
// 3 16 13.48 0 4.39 15.370528 0 5.430528 12.87 0 4.49
  [3,16,13.48,0,4.39,15.370528,0,5.430528,12.87,0,4.49],
// 3 16 13.81 0 4.04 15.370528 0 5.430528 13.48 0 4.39
  [3,16,13.81,0,4.04,15.370528,0,5.430528,13.48,0,4.39],
// 4 16 17.62 0 0 15.370528 0 5.430528 13.81 0 4.04 13.84 0 3.47
  [4,16,17.62,0,0,15.370528,0,5.430528,13.81,0,4.04,13.84,0,3.47],
// 3 16 13.48 0 2.33 17.62 0 0 13.84 0 3.47
  [3,16,13.48,0,2.33,17.62,0,0,13.84,0,3.47],
// 4 16 15.370528 0 -5.430528 17.62 0 0 13.27 0 -3.52 13.26 0 -4.06
  [4,16,15.370528,0,-5.430528,17.62,0,0,13.27,0,-3.52,13.26,0,-4.06],
// 3 16 13.27 0 -3.52 17.62 0 0 12.95 0 -3.14
  [3,16,13.27,0,-3.52,17.62,0,0,12.95,0,-3.14],
// 3 16 12.8 0 -4.32 15.370528 0 -5.430528 13.26 0 -4.06
  [3,16,12.8,0,-4.32,15.370528,0,-5.430528,13.26,0,-4.06],
// 4 16 5.49 0 -3.27 9.94 0 -7.68 7.88 0 -3.82 5.94 0 -3.26
  [4,16,5.49,0,-3.27,9.94,0,-7.68,7.88,0,-3.82,5.94,0,-3.26],
// 3 16 8.31 0 -4.07 7.88 0 -3.82 9.94 0 -7.68
  [3,16,8.31,0,-4.07,7.88,0,-3.82,9.94,0,-7.68],
// 4 16 9.94 0 -7.68 15.370528 0 -5.430528 12.8 0 -4.32 8.31 0 -4.07
  [4,16,9.94,0,-7.68,15.370528,0,-5.430528,12.8,0,-4.32,8.31,0,-4.07],
];
module ldraw_lib__3069bp1d(step=0, col=false, unit=2/5, alt=false, line=0.2, solid=!$preview)
    makepoly(ldraw_lib__3069bp1d(), step=step, col=col, unit=unit, alt=alt, line=line, solid=solid);
ldraw_lib__3069bp1d(line=0.2);
